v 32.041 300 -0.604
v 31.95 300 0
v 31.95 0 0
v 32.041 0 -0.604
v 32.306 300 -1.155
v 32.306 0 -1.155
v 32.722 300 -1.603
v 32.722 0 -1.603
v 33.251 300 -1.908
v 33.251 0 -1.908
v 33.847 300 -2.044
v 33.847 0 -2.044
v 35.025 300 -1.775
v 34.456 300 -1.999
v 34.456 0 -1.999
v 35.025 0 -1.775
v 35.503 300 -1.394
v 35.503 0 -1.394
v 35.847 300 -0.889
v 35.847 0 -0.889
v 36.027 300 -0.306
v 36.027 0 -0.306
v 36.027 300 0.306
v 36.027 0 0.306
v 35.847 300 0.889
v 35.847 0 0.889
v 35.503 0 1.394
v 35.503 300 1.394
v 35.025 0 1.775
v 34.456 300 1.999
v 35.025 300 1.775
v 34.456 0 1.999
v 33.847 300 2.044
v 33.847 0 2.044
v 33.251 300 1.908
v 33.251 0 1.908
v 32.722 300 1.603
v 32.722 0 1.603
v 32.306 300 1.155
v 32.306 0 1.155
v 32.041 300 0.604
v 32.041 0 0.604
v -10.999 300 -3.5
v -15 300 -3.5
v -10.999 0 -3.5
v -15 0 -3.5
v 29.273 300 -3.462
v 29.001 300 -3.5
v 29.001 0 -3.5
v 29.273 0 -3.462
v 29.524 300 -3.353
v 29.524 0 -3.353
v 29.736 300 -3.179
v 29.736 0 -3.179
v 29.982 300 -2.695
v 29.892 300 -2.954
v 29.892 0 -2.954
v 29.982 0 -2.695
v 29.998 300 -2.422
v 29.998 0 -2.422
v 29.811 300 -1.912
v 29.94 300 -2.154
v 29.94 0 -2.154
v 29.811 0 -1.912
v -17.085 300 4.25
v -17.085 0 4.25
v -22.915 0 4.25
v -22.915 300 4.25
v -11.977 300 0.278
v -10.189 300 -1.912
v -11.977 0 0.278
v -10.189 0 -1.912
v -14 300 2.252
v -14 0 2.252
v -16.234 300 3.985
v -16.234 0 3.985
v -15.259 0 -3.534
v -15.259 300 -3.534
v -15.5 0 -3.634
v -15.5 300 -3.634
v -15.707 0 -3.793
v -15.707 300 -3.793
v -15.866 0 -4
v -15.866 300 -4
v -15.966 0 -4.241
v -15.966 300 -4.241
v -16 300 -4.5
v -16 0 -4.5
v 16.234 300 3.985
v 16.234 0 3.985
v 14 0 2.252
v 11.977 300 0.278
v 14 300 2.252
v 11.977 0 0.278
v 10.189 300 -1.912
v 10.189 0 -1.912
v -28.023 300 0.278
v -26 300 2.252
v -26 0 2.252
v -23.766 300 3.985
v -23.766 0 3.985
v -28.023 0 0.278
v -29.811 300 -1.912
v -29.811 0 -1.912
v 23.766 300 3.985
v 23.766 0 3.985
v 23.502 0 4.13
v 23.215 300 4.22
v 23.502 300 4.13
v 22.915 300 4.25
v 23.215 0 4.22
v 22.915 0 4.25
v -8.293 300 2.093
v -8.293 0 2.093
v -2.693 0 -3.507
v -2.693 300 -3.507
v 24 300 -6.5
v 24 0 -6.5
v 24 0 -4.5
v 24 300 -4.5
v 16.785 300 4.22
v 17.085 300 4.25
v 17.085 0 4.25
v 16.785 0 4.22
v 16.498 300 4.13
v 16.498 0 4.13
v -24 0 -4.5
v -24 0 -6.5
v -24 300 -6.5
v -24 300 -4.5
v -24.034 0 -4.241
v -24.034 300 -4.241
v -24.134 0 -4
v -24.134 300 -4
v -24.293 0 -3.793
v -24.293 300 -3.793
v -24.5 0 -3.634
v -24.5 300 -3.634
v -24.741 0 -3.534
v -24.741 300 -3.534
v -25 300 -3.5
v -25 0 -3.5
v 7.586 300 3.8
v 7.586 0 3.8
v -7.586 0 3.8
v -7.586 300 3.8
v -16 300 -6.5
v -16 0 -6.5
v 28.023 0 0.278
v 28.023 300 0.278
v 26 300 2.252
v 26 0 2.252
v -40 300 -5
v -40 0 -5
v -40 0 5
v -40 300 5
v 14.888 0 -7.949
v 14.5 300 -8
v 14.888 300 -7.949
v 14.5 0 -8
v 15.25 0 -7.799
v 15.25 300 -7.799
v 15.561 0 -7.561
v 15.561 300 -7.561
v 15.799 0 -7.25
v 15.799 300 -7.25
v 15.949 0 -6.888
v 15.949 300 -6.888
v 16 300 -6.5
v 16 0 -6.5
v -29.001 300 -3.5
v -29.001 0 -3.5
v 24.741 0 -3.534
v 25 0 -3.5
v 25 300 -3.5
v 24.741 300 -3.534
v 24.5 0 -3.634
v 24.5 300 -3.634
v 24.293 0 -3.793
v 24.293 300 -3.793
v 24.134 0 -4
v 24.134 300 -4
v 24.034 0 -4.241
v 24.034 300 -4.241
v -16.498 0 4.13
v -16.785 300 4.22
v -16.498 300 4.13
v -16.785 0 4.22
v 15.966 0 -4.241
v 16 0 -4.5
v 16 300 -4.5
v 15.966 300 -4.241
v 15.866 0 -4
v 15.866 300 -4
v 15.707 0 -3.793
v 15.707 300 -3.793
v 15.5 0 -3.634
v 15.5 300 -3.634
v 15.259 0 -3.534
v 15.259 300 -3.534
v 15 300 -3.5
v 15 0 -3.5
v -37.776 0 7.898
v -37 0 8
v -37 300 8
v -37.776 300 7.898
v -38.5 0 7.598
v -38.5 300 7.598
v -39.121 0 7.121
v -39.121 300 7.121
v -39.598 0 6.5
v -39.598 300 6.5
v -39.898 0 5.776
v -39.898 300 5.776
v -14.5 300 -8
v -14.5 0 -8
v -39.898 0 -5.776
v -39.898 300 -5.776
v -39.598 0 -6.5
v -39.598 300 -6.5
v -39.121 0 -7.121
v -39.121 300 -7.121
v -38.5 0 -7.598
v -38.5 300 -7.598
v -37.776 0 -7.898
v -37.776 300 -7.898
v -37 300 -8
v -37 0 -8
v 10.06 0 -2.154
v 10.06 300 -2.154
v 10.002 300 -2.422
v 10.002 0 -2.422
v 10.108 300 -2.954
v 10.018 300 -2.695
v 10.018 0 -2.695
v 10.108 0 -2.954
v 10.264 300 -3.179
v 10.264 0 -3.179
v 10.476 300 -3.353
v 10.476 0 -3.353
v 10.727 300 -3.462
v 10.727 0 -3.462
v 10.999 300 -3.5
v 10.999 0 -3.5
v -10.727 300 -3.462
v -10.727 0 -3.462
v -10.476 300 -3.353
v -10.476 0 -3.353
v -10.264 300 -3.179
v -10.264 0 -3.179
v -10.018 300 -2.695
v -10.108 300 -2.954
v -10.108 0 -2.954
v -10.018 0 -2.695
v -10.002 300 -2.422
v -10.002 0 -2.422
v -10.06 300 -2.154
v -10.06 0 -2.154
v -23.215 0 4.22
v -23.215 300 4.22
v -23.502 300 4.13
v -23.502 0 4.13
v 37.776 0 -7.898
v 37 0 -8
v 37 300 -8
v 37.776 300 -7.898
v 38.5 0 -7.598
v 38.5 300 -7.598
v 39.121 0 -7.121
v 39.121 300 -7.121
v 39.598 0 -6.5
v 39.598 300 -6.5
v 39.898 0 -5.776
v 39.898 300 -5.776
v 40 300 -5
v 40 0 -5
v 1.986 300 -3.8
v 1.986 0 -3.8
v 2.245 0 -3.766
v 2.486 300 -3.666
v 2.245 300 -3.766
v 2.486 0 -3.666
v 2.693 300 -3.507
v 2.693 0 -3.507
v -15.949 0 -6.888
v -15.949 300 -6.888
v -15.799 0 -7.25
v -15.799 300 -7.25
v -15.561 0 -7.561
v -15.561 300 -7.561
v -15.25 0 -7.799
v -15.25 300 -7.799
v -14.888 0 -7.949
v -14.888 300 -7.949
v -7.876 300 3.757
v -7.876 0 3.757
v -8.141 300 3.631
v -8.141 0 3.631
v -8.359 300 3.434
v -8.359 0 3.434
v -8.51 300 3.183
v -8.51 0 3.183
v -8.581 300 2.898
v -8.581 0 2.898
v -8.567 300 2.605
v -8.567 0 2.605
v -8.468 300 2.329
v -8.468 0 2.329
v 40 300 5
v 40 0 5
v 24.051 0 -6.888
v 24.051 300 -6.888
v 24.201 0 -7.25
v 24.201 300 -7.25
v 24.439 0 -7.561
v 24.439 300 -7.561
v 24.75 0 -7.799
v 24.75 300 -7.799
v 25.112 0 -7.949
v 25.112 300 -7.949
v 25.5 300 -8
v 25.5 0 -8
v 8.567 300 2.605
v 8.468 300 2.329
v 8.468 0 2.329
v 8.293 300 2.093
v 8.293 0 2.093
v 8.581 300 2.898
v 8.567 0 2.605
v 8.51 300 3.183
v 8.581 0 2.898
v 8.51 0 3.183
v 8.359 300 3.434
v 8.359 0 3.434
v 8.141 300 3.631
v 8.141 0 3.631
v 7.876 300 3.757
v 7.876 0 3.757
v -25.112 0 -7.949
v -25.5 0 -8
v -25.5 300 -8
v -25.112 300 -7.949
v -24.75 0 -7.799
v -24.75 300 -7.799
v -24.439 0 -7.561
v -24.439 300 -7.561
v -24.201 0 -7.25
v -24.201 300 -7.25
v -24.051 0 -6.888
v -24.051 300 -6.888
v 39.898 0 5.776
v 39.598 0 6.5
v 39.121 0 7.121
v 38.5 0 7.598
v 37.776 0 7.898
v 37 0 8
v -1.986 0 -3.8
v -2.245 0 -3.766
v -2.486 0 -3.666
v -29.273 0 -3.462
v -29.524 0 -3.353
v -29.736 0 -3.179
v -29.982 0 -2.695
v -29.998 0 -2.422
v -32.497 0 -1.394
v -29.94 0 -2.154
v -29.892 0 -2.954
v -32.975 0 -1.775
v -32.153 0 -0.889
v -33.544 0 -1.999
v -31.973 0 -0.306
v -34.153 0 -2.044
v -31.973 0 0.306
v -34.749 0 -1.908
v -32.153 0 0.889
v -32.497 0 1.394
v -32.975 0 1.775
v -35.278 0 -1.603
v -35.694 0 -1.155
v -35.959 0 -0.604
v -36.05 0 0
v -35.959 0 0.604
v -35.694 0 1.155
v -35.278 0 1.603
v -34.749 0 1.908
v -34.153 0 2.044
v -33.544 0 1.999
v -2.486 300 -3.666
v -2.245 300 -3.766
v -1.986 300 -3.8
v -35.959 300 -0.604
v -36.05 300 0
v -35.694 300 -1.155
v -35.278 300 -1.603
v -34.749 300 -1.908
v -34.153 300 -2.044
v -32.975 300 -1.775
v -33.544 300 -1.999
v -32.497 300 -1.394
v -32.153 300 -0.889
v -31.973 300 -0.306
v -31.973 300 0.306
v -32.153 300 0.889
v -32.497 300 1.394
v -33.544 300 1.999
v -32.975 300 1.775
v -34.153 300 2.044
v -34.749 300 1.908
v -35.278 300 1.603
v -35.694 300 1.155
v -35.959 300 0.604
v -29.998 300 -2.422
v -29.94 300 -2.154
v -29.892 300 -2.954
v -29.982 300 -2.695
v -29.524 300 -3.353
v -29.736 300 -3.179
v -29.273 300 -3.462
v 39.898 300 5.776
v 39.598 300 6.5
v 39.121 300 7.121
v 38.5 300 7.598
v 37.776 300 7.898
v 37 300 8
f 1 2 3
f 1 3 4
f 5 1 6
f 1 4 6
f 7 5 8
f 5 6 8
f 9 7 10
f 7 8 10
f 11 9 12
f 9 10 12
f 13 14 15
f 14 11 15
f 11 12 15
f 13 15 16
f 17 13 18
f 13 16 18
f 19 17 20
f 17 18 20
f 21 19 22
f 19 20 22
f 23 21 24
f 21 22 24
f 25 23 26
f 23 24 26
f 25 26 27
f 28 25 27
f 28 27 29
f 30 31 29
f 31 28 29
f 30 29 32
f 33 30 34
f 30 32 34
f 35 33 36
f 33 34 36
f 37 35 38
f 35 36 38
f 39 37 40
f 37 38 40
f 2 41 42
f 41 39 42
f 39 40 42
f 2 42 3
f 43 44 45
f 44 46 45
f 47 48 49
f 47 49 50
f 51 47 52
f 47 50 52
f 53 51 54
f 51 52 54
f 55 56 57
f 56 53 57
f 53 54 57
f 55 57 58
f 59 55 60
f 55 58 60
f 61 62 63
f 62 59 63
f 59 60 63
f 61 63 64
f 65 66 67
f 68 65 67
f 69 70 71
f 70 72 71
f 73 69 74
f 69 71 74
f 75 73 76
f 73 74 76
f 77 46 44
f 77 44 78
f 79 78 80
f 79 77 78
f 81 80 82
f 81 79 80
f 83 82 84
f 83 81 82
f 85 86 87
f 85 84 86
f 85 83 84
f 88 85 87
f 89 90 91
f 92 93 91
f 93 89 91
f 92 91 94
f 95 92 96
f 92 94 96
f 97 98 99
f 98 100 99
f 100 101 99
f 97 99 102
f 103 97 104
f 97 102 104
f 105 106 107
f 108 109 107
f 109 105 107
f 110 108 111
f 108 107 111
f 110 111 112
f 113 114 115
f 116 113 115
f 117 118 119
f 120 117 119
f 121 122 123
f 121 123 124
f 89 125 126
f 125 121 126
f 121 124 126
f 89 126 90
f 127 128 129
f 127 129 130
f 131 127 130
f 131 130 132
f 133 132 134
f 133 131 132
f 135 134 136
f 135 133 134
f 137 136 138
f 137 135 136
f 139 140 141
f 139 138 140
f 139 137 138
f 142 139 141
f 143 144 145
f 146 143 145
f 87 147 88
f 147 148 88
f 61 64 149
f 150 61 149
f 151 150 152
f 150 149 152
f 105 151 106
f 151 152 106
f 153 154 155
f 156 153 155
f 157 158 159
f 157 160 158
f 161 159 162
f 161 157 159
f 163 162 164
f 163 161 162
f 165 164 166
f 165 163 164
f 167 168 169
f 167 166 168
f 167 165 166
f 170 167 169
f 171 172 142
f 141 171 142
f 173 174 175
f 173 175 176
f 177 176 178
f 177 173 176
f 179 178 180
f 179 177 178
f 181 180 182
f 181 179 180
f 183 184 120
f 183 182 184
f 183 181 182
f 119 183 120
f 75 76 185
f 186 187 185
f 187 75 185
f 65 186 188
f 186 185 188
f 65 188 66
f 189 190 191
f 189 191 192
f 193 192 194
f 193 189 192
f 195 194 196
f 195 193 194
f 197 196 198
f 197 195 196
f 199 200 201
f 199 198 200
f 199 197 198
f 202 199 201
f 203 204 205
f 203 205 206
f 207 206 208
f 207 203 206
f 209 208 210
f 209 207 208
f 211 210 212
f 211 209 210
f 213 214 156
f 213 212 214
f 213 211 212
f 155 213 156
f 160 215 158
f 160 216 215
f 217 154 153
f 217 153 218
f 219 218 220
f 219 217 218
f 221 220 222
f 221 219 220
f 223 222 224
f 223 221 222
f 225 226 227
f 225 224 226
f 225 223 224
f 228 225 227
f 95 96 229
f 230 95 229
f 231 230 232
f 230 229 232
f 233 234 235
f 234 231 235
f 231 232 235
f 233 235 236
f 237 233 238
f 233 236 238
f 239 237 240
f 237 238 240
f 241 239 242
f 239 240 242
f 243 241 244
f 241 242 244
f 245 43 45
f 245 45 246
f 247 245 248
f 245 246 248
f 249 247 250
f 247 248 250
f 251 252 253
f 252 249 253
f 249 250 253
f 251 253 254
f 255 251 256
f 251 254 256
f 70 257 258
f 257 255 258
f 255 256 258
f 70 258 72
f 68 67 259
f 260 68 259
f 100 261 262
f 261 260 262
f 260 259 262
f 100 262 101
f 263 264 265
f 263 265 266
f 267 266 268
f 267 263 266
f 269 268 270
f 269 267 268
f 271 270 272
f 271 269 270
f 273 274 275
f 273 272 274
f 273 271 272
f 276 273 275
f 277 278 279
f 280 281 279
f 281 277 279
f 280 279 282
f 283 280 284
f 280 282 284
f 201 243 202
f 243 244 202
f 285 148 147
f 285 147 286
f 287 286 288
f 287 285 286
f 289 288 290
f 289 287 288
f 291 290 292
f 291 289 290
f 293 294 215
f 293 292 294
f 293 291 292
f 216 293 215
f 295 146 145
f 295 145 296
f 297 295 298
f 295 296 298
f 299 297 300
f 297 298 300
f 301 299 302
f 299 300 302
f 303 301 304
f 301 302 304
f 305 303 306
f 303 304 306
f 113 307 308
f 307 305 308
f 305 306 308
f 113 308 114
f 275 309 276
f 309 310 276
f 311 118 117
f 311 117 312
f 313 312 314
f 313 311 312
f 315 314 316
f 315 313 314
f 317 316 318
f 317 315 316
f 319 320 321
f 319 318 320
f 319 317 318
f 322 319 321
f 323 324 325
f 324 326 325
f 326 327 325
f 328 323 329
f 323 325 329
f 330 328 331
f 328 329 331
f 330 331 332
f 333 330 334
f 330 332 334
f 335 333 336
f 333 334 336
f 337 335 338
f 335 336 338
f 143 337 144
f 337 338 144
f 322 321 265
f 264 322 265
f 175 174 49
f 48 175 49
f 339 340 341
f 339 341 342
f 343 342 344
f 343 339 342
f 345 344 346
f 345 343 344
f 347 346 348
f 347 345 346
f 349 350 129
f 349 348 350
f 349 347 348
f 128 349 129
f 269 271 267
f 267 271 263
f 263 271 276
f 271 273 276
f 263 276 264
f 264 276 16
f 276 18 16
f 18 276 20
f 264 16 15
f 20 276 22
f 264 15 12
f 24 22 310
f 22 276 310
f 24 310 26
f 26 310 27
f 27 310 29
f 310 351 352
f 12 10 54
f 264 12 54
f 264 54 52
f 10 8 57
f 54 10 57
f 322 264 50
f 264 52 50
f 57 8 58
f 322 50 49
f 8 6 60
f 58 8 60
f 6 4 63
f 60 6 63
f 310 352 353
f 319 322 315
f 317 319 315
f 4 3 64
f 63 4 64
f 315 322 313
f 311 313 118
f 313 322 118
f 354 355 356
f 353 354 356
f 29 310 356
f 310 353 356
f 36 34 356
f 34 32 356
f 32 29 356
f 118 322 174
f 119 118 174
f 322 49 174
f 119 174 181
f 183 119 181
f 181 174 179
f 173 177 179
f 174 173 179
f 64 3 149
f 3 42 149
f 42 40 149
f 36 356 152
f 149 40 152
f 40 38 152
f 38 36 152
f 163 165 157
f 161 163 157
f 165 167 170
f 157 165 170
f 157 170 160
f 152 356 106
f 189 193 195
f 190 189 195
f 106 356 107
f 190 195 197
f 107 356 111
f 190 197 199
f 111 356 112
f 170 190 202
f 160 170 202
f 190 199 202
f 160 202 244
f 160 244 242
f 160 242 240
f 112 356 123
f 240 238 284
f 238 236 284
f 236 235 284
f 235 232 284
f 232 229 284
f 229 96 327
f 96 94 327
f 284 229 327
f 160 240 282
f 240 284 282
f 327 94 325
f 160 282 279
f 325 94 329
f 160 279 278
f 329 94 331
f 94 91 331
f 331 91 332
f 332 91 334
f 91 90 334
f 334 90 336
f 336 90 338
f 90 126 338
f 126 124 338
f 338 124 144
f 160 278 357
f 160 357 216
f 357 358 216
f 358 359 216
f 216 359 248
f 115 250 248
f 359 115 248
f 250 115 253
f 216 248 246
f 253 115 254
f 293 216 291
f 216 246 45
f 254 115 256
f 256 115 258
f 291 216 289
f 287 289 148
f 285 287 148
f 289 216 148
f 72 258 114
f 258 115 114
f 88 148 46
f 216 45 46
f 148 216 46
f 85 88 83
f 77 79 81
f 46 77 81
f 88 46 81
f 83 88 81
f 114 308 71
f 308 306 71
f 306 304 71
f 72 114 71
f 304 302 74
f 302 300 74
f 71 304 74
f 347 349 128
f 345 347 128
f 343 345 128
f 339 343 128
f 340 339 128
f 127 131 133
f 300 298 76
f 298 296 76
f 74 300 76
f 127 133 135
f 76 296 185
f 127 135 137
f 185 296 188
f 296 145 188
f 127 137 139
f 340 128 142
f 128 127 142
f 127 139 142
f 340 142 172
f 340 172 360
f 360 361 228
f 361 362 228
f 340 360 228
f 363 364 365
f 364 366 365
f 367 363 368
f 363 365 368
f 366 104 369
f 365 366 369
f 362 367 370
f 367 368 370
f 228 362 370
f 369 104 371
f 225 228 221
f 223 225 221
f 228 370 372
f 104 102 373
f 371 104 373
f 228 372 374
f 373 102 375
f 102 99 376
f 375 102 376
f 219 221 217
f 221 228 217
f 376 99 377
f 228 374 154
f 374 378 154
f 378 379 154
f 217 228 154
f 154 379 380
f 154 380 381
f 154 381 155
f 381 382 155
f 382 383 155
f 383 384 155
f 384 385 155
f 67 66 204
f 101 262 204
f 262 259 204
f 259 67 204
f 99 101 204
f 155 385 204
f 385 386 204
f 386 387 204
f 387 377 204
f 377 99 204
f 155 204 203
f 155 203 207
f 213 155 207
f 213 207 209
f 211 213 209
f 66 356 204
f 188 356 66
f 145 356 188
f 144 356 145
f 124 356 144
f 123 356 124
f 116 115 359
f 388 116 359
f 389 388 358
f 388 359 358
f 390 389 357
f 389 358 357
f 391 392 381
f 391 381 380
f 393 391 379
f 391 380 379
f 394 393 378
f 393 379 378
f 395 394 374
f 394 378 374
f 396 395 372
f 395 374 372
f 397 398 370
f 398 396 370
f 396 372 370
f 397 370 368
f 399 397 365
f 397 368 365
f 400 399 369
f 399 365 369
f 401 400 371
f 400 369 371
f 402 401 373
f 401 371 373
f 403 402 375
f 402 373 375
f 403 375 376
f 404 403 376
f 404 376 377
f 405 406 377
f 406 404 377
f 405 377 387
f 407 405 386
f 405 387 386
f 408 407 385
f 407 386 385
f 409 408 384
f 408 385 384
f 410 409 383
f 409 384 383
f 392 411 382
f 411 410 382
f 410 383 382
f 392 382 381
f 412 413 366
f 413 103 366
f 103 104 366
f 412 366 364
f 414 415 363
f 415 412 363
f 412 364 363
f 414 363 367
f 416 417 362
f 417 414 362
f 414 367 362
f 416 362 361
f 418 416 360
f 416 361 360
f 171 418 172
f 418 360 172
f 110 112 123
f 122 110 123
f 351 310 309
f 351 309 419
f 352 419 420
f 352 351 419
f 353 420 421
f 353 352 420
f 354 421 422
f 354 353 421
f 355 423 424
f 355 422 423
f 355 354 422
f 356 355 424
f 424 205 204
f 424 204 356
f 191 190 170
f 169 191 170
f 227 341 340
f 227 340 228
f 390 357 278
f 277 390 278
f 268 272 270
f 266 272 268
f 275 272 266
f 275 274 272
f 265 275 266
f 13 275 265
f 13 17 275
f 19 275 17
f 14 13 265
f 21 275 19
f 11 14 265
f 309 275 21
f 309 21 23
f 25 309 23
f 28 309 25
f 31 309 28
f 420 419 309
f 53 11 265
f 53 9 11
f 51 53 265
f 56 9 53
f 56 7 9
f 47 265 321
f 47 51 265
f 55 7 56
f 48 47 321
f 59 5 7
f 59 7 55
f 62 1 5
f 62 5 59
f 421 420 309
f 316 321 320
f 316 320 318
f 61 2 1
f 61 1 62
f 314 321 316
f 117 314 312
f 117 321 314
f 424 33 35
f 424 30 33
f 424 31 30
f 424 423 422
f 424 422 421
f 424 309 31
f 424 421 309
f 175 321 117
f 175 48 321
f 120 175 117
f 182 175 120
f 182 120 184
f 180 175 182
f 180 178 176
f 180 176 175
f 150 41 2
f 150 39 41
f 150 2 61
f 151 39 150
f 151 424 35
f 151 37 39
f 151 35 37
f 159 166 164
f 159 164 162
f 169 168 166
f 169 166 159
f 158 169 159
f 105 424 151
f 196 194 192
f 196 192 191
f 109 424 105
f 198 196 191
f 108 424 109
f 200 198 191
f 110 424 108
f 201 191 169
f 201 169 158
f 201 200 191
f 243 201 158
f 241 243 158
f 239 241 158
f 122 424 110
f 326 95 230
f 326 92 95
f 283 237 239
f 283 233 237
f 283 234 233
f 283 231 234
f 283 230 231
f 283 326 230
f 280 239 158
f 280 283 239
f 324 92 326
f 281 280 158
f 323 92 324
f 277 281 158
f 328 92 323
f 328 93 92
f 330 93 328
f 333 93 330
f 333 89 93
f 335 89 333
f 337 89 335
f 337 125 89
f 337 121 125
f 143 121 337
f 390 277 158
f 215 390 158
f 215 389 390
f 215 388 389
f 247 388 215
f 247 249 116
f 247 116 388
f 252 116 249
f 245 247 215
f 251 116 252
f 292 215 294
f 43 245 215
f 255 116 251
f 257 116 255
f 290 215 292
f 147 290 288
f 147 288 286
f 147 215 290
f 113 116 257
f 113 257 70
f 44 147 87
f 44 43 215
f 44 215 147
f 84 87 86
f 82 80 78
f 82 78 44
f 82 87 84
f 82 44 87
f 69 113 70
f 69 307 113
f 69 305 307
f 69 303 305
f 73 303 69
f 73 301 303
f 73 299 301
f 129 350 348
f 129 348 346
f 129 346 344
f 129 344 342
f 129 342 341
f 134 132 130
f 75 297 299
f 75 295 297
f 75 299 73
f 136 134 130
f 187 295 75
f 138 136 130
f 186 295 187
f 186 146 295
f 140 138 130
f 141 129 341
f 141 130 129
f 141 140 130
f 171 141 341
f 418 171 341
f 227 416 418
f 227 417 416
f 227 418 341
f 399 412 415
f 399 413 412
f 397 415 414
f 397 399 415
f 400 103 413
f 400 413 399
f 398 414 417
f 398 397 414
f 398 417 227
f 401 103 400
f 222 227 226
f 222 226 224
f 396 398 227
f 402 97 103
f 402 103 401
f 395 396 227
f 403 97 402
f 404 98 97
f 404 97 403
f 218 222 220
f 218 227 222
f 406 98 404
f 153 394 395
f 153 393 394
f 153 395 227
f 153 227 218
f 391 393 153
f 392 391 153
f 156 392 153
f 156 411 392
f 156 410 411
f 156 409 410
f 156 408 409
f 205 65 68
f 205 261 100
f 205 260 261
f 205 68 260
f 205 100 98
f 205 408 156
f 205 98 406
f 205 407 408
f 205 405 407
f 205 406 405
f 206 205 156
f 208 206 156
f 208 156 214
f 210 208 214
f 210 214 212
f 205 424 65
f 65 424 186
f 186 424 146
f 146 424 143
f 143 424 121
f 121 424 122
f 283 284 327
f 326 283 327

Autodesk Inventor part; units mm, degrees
ref_plane "YZ Plane" through (0, 0, 0) normal (1, 0, 0) x (0, 1, 0)
ref_plane "Start Plane" through (0, 0, 0) normal (0, 1, 0) x (-1, 0, 0)
ref_plane "End Plane" through (0, 300, 0) normal (0, 1, 0) x (-1, 0, 0)
sketch "Sketch1" plane through (0, 0, 0) normal (0, 1, 0) x (-1, 0, 0)
  line L0 (40, -5) -> (40, 5)
  arc A0 (40, 5) -> (37, 8) centre (37, 5) ccw
  line L1 (37, 8) -> (-37, 8)
  line L2 (14.5, -8) -> (-14.5, -8)
  arc A1 (14.5, -8) -> (16, -6.5) centre (14.5, -6.5) ccw
  line L3 (-25.5, -8) -> (-37, -8)
  arc A2 (-25.5, -8) -> (-24, -6.5) centre (-25.5, -6.5) ccw
  arc A3 (-37, 8) -> (-40, 5) centre (-37, 5) ccw
  line L4 (-40, 5) -> (-40, -5)
  arc A4 (-40, -5) -> (-37, -8) centre (-37, -5) ccw
  line L5 (-24, -6.5) -> (-24, -4.5)
  arc A5 (-24, -4.5) -> (-25, -3.5) centre (-25, -4.5) ccw
  line L6 (-25, -3.5) -> (-29.0014, -3.5)
  arc A6 (-29.8106, -1.9125) -> (-29.0014, -3.5) centre (-29.0014, -2.5) ccw
  arc A7 (-23.7664, 3.9851) -> (-29.8106, -1.9125) centre (-9.58, -16.6) ccw
  arc A8 (-22.9152, 4.25) -> (-23.7664, 3.9851) centre (-22.9152, 2.75) ccw
  line L7 (-22.9152, 4.25) -> (-17.0848, 4.25)
  arc A9 (-16.2336, 3.9851) -> (-17.0848, 4.25) centre (-17.0848, 2.75) ccw
  arc A10 (-10.1894, -1.9125) -> (-16.2336, 3.9851) centre (-30.42, -16.6) ccw
  arc A11 (-10.9986, -3.5) -> (-10.1894, -1.9125) centre (-10.9986, -2.5) ccw
  line L8 (-10.9986, -3.5) -> (-15, -3.5)
  arc A12 (-15, -3.5) -> (-16, -4.5) centre (-15, -4.5) ccw
  line L9 (-16, -4.5) -> (-16, -6.5)
  arc A13 (-16, -6.5) -> (-14.5, -8) centre (-14.5, -6.5) ccw
  line L10 (16, -6.5) -> (16, -4.5)
  arc A14 (16, -4.5) -> (15, -3.5) centre (15, -4.5) ccw
  line L11 (15, -3.5) -> (10.9986, -3.5)
  arc A15 (10.1894, -1.9125) -> (10.9986, -3.5) centre (10.9986, -2.5) ccw
  arc A16 (16.2336, 3.9851) -> (10.1894, -1.9125) centre (30.42, -16.6) ccw
  arc A17 (17.0848, 4.25) -> (16.2336, 3.9851) centre (17.0848, 2.75) ccw
  line L12 (17.0848, 4.25) -> (22.9152, 4.25)
  arc A18 (23.7664, 3.9851) -> (22.9152, 4.25) centre (22.9152, 2.75) ccw
  arc A19 (29.8106, -1.9125) -> (23.7664, 3.9851) centre (9.58, -16.6) ccw
  arc A20 (29.0014, -3.5) -> (29.8106, -1.9125) centre (29.0014, -2.5) ccw
  line L13 (29.0014, -3.5) -> (25, -3.5)
  arc A21 (25, -3.5) -> (24, -4.5) centre (25, -4.5) ccw
  line L14 (1.9858, -3.8) -> (-1.9858, -3.8)
  arc A22 (-2.6929, -3.5071) -> (-1.9858, -3.8) centre (-1.9858, -2.8) ccw
  line L15 (-2.6929, -3.5071) -> (-8.2929, 2.0929)
  arc A23 (-7.5858, 3.8) -> (-8.2929, 2.0929) centre (-7.5858, 2.8) ccw
  line L16 (-7.5858, 3.8) -> (7.5858, 3.8)
  arc A24 (8.2929, 2.0929) -> (7.5858, 3.8) centre (7.5858, 2.8) ccw
  line L17 (8.2929, 2.0929) -> (2.6929, -3.5071)
  arc A25 (1.9858, -3.8) -> (2.6929, -3.5071) centre (1.9858, -2.8) ccw
  circle A26 centre (-34, 0) radius 2.05
  circle A27 centre (34, 0) radius 2.05
  line L18 (25.5, -8) -> (37, -8)
  arc A28 (24, -6.5) -> (25.5, -8) centre (25.5, -6.5) ccw
  arc A29 (37, -8) -> (40, -5) centre (37, -5) ccw
  line L19 (24, -6.5) -> (24, -4.5)
  point P0 (0, 0)
extrude "Body" add sketch "Sketch1" along normal up to surface (300 mm away) from surface at 0
sketch "Sketch2" plane through (0, 0, 0) normal (0, 1, 0) x (-1, 0, 0)
  line L0 (0, 0) -> (10, 0)
ref_plane "Work Plane3" through (0, 0, 0) normal (0, 0, -1) x (-1, 0, 0)
sketch "Sketch3" plane through (0, 0, 0) normal (0, 0, -1) x (-1, 0, 0)
  line L0 (-2, 0) -> (12, 0)
  line L1 (-2, 300) -> (12, 300)
  dimension "d15" = 300
ref_plane "Piano di lavoro4" through (-37, 0, -8) normal (0, 0, 1) x (1, 0, 0)
equation "\"G_OFFSET_START\" = 0"
equation "\"G_OFFSET_END\" = 0"
equation "\"G_L\" = d15"
properties part number "10-081"
